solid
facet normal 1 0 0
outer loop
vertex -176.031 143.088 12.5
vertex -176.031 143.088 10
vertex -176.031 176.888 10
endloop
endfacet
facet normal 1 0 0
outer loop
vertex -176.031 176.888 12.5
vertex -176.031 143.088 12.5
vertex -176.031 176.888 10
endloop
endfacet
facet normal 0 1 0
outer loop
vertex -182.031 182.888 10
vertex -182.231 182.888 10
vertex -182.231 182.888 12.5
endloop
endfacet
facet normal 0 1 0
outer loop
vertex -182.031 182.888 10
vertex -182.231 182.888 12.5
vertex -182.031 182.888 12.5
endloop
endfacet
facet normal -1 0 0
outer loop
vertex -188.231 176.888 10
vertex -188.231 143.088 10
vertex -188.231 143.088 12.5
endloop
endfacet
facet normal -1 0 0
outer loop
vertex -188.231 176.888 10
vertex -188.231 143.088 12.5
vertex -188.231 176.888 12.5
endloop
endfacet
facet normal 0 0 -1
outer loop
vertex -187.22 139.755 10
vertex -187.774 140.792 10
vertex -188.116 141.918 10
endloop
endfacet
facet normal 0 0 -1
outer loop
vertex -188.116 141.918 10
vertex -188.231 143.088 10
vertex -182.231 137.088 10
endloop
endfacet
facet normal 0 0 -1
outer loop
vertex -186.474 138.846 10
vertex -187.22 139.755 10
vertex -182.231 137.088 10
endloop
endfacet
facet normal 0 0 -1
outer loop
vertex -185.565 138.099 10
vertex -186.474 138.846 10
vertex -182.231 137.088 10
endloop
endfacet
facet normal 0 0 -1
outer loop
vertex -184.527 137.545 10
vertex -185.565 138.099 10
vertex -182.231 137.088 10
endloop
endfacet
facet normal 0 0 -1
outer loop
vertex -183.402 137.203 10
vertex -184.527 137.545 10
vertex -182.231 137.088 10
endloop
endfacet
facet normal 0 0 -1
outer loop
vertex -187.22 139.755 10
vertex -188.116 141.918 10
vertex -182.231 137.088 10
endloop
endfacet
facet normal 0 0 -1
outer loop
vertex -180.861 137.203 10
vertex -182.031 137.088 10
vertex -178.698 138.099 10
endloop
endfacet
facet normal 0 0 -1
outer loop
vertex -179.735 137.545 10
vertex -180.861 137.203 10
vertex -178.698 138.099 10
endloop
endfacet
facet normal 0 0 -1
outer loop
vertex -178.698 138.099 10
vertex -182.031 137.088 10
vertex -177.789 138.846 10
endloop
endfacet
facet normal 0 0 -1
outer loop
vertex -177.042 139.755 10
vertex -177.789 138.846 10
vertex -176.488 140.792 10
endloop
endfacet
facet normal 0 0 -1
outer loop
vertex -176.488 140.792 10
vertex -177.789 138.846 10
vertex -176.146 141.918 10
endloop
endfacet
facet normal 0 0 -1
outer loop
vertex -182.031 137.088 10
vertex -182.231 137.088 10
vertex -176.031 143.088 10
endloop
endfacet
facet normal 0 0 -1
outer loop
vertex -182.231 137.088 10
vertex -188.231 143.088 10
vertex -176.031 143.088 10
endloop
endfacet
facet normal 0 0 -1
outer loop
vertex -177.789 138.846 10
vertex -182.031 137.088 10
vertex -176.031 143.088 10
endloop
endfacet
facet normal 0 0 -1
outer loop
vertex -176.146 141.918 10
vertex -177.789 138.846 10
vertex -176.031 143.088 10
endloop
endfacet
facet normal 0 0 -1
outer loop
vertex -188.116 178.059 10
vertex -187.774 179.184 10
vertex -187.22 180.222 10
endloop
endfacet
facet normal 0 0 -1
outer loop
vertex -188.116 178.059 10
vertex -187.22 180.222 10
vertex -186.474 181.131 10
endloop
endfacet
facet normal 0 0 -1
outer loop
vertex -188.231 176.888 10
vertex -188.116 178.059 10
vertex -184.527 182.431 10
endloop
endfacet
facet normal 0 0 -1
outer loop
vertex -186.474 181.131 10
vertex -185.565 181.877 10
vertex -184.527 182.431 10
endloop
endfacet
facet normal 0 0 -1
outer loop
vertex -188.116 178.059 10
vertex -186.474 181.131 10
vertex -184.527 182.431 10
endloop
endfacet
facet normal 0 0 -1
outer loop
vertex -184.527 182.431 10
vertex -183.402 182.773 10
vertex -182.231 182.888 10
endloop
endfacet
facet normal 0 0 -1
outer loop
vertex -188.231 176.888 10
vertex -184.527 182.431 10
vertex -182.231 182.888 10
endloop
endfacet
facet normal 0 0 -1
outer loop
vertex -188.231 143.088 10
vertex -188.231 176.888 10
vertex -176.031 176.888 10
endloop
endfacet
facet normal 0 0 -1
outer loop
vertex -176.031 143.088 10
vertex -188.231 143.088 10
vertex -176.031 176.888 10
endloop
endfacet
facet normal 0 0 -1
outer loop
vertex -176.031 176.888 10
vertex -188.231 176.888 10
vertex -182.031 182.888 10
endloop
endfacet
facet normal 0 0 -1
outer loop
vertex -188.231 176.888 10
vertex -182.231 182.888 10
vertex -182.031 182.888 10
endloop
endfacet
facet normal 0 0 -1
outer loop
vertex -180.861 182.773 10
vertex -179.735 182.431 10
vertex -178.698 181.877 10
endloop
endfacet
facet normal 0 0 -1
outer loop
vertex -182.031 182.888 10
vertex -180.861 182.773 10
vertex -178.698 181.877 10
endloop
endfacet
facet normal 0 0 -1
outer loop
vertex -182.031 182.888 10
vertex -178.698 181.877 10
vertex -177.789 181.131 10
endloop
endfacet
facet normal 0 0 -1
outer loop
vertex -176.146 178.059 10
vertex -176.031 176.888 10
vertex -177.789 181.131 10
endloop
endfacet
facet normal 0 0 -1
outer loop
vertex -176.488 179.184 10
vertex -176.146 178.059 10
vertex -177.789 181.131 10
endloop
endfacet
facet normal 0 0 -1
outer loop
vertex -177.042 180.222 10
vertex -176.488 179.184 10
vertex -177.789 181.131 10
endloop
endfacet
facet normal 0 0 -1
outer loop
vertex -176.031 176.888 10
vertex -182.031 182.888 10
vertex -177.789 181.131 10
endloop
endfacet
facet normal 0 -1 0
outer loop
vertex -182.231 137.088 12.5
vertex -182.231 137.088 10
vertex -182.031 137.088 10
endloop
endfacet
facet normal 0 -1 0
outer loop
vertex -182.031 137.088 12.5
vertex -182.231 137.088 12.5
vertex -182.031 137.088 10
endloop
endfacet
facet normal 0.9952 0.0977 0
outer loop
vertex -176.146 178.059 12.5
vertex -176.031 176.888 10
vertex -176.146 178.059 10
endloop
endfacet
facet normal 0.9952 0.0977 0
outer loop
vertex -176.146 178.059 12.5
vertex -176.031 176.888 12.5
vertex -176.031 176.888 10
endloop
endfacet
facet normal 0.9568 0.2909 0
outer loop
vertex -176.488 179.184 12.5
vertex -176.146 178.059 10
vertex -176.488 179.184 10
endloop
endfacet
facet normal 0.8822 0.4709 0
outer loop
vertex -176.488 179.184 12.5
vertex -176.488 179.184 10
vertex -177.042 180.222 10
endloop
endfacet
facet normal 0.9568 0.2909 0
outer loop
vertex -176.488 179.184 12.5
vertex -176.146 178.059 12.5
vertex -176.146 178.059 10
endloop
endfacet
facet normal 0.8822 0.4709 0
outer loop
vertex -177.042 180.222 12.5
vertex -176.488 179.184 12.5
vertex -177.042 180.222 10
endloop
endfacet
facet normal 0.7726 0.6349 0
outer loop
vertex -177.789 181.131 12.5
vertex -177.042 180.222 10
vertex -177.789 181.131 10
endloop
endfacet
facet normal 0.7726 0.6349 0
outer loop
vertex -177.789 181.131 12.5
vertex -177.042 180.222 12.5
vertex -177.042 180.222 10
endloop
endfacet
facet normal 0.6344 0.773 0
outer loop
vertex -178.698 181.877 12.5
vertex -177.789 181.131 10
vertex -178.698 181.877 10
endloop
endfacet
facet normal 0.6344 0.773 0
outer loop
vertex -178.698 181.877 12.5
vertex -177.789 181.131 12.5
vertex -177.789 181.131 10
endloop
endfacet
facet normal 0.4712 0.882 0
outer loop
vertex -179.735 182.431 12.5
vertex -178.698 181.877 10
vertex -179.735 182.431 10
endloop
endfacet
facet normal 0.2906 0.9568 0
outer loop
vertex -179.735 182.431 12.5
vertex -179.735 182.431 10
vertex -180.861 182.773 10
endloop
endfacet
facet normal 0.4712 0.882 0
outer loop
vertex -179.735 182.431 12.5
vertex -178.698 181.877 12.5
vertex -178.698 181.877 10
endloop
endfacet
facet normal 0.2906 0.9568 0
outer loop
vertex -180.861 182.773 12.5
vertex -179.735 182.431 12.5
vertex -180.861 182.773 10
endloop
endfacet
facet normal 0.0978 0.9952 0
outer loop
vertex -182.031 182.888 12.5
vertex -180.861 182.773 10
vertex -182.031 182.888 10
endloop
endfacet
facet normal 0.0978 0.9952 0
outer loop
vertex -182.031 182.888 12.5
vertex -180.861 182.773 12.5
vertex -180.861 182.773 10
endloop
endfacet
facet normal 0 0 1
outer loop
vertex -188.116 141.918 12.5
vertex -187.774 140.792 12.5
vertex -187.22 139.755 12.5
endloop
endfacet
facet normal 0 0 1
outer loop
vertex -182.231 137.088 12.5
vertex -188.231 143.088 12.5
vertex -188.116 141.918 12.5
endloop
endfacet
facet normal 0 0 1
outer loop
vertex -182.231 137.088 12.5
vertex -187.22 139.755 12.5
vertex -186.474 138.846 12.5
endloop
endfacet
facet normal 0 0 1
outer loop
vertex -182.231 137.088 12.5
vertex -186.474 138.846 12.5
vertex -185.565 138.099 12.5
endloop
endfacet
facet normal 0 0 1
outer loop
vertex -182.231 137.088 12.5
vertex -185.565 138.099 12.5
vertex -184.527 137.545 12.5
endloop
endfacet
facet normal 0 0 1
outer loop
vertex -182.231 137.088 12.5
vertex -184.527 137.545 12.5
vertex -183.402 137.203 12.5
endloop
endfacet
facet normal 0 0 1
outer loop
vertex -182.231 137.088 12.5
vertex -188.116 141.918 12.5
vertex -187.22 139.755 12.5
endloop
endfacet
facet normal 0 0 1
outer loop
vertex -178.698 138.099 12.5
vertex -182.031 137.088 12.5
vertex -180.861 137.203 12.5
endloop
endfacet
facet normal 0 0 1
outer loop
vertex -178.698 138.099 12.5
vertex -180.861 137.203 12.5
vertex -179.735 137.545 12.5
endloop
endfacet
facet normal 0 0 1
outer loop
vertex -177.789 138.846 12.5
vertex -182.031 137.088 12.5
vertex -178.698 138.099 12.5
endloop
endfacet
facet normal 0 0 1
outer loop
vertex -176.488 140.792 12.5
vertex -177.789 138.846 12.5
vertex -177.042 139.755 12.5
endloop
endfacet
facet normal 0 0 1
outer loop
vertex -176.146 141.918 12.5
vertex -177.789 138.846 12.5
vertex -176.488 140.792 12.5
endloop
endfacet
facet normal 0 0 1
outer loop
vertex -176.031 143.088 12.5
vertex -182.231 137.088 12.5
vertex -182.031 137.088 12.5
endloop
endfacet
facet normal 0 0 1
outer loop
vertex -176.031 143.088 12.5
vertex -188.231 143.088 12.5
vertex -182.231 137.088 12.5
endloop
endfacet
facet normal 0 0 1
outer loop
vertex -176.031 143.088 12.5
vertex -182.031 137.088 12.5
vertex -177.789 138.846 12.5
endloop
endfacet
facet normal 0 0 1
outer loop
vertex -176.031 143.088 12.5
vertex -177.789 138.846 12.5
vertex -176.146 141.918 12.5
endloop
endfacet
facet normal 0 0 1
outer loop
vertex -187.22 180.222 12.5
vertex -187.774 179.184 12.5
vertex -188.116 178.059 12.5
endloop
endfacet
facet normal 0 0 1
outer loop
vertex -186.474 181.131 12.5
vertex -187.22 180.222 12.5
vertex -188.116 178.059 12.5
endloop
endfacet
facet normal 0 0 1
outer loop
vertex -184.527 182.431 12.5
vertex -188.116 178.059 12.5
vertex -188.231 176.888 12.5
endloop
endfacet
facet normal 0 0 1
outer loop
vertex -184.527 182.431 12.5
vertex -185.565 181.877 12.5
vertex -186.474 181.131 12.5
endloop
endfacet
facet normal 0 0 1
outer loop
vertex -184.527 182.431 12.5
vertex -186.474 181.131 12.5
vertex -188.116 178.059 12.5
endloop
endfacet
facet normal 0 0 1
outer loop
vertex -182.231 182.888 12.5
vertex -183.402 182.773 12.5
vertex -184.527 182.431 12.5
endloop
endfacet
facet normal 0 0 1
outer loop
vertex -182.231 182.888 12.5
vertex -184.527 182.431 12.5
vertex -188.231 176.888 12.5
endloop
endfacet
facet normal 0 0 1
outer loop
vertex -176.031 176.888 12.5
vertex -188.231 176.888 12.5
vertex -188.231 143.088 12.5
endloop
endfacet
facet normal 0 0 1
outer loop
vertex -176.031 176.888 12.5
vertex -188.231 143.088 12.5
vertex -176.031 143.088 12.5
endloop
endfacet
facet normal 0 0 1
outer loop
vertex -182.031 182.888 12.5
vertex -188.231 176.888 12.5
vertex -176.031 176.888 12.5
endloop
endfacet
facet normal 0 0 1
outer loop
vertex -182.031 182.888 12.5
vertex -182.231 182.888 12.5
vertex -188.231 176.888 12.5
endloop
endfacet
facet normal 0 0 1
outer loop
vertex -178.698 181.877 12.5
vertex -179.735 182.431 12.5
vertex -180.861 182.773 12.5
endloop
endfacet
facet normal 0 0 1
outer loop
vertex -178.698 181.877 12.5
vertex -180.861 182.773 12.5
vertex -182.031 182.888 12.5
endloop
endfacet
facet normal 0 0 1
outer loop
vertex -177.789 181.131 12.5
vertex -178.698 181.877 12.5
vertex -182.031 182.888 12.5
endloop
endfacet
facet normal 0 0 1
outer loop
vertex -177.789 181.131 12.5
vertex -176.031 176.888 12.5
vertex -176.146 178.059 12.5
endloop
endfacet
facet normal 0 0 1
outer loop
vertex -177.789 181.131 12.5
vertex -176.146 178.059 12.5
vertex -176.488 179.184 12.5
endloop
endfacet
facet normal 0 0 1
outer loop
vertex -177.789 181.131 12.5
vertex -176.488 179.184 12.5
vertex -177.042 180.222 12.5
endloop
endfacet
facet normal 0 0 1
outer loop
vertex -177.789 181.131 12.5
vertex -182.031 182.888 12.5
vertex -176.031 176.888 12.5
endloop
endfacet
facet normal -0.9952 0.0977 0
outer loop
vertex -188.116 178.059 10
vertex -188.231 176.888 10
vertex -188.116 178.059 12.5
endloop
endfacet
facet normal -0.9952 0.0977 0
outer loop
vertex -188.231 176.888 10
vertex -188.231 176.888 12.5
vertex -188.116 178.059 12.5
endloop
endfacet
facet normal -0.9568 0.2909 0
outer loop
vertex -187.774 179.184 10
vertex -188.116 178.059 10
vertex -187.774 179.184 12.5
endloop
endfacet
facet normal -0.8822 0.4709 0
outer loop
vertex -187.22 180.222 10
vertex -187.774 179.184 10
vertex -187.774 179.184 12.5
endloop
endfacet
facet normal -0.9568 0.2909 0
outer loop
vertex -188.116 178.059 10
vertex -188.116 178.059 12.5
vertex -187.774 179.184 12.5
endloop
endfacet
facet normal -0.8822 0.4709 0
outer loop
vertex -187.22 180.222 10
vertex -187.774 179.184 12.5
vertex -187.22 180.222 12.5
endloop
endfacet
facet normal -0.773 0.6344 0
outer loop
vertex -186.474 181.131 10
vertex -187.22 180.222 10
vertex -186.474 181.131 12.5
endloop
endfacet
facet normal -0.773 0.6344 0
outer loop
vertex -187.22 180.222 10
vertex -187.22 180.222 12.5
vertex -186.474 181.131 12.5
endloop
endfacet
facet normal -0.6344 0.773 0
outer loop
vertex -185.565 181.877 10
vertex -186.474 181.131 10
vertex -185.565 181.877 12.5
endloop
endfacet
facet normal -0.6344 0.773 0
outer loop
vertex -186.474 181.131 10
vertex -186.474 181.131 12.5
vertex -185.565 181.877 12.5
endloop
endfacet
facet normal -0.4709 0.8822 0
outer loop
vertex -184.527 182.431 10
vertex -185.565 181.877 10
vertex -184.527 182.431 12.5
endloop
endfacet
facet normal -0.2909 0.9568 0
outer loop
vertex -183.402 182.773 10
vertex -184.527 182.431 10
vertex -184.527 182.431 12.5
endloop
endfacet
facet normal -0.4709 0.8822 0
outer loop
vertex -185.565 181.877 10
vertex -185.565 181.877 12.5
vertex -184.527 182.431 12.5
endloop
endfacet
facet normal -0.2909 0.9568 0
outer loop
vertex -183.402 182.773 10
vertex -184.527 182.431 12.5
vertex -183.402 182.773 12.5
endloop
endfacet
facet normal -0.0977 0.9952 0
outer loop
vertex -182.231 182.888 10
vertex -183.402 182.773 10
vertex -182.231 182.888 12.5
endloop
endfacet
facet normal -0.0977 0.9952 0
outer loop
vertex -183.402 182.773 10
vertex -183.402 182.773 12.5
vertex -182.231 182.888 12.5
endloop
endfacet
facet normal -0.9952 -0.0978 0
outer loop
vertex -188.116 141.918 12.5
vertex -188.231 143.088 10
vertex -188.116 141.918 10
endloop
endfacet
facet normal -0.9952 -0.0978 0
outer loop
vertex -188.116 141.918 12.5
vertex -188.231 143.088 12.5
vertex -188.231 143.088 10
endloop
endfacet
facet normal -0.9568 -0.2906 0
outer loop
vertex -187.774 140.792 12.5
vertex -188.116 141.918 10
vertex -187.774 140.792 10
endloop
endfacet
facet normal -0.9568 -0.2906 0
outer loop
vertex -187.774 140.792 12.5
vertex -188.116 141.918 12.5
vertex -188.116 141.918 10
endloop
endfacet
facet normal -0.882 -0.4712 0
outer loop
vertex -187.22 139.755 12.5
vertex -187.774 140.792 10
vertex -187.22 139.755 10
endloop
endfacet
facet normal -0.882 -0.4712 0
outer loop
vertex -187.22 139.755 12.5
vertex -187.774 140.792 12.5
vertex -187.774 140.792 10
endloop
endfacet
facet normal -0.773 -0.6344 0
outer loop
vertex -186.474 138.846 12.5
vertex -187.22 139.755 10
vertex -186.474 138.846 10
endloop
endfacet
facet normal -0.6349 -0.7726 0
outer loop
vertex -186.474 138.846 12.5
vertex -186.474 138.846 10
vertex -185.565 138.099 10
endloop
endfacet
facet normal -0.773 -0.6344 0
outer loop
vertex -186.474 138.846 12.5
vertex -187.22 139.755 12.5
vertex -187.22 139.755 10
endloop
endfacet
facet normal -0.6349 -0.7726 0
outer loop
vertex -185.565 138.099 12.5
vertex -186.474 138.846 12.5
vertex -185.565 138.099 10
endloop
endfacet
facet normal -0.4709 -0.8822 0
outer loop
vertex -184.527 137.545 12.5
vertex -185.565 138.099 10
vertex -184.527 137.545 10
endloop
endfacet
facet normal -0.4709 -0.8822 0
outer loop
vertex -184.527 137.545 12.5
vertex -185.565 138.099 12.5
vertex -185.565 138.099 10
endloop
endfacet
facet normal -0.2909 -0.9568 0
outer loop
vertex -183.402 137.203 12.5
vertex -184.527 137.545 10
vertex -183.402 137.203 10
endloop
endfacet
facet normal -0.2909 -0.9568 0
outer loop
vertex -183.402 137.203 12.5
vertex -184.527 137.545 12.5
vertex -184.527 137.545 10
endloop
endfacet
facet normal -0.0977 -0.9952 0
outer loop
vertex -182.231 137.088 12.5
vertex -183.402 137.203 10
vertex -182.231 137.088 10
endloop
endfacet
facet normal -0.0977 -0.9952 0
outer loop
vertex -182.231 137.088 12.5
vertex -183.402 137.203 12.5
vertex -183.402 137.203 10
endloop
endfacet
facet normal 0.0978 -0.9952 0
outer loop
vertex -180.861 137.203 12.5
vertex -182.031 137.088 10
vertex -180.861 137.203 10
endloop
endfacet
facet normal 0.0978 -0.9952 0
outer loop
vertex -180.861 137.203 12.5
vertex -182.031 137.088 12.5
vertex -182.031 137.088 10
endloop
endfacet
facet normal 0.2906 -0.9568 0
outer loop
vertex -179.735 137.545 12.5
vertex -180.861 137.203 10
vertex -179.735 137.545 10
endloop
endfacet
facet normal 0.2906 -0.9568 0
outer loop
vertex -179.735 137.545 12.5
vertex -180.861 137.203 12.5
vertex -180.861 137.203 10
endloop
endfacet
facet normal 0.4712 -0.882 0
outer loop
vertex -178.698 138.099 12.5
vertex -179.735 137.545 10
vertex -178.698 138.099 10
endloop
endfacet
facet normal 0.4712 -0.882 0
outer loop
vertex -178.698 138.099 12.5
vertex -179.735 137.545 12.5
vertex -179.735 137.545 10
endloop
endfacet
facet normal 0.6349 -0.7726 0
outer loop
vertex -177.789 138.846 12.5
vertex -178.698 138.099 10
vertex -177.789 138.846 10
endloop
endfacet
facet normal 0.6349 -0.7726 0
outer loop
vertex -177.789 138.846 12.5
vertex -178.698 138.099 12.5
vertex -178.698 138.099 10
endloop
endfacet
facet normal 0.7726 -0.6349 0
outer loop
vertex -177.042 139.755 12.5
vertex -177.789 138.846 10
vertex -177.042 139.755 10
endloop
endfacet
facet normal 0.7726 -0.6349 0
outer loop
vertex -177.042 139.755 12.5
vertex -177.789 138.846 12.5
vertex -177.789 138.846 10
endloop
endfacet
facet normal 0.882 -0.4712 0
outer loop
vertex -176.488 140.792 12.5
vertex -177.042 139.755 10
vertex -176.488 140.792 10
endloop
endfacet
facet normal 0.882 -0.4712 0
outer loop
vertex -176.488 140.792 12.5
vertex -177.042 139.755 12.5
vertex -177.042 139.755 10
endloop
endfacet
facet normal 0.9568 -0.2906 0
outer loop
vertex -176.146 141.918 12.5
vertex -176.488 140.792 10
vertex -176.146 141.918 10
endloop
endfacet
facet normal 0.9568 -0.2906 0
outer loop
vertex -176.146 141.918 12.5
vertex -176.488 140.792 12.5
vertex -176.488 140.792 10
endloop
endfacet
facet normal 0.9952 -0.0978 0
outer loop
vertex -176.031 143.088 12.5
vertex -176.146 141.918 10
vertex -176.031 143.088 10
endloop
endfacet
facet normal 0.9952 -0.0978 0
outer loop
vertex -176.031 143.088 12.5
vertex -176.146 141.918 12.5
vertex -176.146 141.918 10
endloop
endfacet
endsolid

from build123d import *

# Parameters (mm, degrees)
SKETCH1_W           = 12.2
SKETCH1_H           = 45.8
BOSS_EXTRUDE1_DEPTH = 2.5
FILLET1_R           = 6


with BuildPart() as part:
    # Sketch1 → Boss-Extrude1 (new body)
    with BuildSketch(Plane.XY.offset(10)):
        with Locations((-182.131179691, 159.988166791)):
            Rectangle(SKETCH1_W, SKETCH1_H)
    extrude(amount=BOSS_EXTRUDE1_DEPTH)

    # Fillet1
    fillet1_edges = [part.edges().sort_by_distance(p)[0] for p in [
        (-188.231179691, 182.888166791, 11.25),
        (-176.031179691, 182.888166791, 11.25),
        (-176.031179691, 137.088166791, 11.25),
        (-188.231179691, 137.088166791, 11.25),
    ]]
    fillet(fillet1_edges, radius=FILLET1_R)


solid = part.part
